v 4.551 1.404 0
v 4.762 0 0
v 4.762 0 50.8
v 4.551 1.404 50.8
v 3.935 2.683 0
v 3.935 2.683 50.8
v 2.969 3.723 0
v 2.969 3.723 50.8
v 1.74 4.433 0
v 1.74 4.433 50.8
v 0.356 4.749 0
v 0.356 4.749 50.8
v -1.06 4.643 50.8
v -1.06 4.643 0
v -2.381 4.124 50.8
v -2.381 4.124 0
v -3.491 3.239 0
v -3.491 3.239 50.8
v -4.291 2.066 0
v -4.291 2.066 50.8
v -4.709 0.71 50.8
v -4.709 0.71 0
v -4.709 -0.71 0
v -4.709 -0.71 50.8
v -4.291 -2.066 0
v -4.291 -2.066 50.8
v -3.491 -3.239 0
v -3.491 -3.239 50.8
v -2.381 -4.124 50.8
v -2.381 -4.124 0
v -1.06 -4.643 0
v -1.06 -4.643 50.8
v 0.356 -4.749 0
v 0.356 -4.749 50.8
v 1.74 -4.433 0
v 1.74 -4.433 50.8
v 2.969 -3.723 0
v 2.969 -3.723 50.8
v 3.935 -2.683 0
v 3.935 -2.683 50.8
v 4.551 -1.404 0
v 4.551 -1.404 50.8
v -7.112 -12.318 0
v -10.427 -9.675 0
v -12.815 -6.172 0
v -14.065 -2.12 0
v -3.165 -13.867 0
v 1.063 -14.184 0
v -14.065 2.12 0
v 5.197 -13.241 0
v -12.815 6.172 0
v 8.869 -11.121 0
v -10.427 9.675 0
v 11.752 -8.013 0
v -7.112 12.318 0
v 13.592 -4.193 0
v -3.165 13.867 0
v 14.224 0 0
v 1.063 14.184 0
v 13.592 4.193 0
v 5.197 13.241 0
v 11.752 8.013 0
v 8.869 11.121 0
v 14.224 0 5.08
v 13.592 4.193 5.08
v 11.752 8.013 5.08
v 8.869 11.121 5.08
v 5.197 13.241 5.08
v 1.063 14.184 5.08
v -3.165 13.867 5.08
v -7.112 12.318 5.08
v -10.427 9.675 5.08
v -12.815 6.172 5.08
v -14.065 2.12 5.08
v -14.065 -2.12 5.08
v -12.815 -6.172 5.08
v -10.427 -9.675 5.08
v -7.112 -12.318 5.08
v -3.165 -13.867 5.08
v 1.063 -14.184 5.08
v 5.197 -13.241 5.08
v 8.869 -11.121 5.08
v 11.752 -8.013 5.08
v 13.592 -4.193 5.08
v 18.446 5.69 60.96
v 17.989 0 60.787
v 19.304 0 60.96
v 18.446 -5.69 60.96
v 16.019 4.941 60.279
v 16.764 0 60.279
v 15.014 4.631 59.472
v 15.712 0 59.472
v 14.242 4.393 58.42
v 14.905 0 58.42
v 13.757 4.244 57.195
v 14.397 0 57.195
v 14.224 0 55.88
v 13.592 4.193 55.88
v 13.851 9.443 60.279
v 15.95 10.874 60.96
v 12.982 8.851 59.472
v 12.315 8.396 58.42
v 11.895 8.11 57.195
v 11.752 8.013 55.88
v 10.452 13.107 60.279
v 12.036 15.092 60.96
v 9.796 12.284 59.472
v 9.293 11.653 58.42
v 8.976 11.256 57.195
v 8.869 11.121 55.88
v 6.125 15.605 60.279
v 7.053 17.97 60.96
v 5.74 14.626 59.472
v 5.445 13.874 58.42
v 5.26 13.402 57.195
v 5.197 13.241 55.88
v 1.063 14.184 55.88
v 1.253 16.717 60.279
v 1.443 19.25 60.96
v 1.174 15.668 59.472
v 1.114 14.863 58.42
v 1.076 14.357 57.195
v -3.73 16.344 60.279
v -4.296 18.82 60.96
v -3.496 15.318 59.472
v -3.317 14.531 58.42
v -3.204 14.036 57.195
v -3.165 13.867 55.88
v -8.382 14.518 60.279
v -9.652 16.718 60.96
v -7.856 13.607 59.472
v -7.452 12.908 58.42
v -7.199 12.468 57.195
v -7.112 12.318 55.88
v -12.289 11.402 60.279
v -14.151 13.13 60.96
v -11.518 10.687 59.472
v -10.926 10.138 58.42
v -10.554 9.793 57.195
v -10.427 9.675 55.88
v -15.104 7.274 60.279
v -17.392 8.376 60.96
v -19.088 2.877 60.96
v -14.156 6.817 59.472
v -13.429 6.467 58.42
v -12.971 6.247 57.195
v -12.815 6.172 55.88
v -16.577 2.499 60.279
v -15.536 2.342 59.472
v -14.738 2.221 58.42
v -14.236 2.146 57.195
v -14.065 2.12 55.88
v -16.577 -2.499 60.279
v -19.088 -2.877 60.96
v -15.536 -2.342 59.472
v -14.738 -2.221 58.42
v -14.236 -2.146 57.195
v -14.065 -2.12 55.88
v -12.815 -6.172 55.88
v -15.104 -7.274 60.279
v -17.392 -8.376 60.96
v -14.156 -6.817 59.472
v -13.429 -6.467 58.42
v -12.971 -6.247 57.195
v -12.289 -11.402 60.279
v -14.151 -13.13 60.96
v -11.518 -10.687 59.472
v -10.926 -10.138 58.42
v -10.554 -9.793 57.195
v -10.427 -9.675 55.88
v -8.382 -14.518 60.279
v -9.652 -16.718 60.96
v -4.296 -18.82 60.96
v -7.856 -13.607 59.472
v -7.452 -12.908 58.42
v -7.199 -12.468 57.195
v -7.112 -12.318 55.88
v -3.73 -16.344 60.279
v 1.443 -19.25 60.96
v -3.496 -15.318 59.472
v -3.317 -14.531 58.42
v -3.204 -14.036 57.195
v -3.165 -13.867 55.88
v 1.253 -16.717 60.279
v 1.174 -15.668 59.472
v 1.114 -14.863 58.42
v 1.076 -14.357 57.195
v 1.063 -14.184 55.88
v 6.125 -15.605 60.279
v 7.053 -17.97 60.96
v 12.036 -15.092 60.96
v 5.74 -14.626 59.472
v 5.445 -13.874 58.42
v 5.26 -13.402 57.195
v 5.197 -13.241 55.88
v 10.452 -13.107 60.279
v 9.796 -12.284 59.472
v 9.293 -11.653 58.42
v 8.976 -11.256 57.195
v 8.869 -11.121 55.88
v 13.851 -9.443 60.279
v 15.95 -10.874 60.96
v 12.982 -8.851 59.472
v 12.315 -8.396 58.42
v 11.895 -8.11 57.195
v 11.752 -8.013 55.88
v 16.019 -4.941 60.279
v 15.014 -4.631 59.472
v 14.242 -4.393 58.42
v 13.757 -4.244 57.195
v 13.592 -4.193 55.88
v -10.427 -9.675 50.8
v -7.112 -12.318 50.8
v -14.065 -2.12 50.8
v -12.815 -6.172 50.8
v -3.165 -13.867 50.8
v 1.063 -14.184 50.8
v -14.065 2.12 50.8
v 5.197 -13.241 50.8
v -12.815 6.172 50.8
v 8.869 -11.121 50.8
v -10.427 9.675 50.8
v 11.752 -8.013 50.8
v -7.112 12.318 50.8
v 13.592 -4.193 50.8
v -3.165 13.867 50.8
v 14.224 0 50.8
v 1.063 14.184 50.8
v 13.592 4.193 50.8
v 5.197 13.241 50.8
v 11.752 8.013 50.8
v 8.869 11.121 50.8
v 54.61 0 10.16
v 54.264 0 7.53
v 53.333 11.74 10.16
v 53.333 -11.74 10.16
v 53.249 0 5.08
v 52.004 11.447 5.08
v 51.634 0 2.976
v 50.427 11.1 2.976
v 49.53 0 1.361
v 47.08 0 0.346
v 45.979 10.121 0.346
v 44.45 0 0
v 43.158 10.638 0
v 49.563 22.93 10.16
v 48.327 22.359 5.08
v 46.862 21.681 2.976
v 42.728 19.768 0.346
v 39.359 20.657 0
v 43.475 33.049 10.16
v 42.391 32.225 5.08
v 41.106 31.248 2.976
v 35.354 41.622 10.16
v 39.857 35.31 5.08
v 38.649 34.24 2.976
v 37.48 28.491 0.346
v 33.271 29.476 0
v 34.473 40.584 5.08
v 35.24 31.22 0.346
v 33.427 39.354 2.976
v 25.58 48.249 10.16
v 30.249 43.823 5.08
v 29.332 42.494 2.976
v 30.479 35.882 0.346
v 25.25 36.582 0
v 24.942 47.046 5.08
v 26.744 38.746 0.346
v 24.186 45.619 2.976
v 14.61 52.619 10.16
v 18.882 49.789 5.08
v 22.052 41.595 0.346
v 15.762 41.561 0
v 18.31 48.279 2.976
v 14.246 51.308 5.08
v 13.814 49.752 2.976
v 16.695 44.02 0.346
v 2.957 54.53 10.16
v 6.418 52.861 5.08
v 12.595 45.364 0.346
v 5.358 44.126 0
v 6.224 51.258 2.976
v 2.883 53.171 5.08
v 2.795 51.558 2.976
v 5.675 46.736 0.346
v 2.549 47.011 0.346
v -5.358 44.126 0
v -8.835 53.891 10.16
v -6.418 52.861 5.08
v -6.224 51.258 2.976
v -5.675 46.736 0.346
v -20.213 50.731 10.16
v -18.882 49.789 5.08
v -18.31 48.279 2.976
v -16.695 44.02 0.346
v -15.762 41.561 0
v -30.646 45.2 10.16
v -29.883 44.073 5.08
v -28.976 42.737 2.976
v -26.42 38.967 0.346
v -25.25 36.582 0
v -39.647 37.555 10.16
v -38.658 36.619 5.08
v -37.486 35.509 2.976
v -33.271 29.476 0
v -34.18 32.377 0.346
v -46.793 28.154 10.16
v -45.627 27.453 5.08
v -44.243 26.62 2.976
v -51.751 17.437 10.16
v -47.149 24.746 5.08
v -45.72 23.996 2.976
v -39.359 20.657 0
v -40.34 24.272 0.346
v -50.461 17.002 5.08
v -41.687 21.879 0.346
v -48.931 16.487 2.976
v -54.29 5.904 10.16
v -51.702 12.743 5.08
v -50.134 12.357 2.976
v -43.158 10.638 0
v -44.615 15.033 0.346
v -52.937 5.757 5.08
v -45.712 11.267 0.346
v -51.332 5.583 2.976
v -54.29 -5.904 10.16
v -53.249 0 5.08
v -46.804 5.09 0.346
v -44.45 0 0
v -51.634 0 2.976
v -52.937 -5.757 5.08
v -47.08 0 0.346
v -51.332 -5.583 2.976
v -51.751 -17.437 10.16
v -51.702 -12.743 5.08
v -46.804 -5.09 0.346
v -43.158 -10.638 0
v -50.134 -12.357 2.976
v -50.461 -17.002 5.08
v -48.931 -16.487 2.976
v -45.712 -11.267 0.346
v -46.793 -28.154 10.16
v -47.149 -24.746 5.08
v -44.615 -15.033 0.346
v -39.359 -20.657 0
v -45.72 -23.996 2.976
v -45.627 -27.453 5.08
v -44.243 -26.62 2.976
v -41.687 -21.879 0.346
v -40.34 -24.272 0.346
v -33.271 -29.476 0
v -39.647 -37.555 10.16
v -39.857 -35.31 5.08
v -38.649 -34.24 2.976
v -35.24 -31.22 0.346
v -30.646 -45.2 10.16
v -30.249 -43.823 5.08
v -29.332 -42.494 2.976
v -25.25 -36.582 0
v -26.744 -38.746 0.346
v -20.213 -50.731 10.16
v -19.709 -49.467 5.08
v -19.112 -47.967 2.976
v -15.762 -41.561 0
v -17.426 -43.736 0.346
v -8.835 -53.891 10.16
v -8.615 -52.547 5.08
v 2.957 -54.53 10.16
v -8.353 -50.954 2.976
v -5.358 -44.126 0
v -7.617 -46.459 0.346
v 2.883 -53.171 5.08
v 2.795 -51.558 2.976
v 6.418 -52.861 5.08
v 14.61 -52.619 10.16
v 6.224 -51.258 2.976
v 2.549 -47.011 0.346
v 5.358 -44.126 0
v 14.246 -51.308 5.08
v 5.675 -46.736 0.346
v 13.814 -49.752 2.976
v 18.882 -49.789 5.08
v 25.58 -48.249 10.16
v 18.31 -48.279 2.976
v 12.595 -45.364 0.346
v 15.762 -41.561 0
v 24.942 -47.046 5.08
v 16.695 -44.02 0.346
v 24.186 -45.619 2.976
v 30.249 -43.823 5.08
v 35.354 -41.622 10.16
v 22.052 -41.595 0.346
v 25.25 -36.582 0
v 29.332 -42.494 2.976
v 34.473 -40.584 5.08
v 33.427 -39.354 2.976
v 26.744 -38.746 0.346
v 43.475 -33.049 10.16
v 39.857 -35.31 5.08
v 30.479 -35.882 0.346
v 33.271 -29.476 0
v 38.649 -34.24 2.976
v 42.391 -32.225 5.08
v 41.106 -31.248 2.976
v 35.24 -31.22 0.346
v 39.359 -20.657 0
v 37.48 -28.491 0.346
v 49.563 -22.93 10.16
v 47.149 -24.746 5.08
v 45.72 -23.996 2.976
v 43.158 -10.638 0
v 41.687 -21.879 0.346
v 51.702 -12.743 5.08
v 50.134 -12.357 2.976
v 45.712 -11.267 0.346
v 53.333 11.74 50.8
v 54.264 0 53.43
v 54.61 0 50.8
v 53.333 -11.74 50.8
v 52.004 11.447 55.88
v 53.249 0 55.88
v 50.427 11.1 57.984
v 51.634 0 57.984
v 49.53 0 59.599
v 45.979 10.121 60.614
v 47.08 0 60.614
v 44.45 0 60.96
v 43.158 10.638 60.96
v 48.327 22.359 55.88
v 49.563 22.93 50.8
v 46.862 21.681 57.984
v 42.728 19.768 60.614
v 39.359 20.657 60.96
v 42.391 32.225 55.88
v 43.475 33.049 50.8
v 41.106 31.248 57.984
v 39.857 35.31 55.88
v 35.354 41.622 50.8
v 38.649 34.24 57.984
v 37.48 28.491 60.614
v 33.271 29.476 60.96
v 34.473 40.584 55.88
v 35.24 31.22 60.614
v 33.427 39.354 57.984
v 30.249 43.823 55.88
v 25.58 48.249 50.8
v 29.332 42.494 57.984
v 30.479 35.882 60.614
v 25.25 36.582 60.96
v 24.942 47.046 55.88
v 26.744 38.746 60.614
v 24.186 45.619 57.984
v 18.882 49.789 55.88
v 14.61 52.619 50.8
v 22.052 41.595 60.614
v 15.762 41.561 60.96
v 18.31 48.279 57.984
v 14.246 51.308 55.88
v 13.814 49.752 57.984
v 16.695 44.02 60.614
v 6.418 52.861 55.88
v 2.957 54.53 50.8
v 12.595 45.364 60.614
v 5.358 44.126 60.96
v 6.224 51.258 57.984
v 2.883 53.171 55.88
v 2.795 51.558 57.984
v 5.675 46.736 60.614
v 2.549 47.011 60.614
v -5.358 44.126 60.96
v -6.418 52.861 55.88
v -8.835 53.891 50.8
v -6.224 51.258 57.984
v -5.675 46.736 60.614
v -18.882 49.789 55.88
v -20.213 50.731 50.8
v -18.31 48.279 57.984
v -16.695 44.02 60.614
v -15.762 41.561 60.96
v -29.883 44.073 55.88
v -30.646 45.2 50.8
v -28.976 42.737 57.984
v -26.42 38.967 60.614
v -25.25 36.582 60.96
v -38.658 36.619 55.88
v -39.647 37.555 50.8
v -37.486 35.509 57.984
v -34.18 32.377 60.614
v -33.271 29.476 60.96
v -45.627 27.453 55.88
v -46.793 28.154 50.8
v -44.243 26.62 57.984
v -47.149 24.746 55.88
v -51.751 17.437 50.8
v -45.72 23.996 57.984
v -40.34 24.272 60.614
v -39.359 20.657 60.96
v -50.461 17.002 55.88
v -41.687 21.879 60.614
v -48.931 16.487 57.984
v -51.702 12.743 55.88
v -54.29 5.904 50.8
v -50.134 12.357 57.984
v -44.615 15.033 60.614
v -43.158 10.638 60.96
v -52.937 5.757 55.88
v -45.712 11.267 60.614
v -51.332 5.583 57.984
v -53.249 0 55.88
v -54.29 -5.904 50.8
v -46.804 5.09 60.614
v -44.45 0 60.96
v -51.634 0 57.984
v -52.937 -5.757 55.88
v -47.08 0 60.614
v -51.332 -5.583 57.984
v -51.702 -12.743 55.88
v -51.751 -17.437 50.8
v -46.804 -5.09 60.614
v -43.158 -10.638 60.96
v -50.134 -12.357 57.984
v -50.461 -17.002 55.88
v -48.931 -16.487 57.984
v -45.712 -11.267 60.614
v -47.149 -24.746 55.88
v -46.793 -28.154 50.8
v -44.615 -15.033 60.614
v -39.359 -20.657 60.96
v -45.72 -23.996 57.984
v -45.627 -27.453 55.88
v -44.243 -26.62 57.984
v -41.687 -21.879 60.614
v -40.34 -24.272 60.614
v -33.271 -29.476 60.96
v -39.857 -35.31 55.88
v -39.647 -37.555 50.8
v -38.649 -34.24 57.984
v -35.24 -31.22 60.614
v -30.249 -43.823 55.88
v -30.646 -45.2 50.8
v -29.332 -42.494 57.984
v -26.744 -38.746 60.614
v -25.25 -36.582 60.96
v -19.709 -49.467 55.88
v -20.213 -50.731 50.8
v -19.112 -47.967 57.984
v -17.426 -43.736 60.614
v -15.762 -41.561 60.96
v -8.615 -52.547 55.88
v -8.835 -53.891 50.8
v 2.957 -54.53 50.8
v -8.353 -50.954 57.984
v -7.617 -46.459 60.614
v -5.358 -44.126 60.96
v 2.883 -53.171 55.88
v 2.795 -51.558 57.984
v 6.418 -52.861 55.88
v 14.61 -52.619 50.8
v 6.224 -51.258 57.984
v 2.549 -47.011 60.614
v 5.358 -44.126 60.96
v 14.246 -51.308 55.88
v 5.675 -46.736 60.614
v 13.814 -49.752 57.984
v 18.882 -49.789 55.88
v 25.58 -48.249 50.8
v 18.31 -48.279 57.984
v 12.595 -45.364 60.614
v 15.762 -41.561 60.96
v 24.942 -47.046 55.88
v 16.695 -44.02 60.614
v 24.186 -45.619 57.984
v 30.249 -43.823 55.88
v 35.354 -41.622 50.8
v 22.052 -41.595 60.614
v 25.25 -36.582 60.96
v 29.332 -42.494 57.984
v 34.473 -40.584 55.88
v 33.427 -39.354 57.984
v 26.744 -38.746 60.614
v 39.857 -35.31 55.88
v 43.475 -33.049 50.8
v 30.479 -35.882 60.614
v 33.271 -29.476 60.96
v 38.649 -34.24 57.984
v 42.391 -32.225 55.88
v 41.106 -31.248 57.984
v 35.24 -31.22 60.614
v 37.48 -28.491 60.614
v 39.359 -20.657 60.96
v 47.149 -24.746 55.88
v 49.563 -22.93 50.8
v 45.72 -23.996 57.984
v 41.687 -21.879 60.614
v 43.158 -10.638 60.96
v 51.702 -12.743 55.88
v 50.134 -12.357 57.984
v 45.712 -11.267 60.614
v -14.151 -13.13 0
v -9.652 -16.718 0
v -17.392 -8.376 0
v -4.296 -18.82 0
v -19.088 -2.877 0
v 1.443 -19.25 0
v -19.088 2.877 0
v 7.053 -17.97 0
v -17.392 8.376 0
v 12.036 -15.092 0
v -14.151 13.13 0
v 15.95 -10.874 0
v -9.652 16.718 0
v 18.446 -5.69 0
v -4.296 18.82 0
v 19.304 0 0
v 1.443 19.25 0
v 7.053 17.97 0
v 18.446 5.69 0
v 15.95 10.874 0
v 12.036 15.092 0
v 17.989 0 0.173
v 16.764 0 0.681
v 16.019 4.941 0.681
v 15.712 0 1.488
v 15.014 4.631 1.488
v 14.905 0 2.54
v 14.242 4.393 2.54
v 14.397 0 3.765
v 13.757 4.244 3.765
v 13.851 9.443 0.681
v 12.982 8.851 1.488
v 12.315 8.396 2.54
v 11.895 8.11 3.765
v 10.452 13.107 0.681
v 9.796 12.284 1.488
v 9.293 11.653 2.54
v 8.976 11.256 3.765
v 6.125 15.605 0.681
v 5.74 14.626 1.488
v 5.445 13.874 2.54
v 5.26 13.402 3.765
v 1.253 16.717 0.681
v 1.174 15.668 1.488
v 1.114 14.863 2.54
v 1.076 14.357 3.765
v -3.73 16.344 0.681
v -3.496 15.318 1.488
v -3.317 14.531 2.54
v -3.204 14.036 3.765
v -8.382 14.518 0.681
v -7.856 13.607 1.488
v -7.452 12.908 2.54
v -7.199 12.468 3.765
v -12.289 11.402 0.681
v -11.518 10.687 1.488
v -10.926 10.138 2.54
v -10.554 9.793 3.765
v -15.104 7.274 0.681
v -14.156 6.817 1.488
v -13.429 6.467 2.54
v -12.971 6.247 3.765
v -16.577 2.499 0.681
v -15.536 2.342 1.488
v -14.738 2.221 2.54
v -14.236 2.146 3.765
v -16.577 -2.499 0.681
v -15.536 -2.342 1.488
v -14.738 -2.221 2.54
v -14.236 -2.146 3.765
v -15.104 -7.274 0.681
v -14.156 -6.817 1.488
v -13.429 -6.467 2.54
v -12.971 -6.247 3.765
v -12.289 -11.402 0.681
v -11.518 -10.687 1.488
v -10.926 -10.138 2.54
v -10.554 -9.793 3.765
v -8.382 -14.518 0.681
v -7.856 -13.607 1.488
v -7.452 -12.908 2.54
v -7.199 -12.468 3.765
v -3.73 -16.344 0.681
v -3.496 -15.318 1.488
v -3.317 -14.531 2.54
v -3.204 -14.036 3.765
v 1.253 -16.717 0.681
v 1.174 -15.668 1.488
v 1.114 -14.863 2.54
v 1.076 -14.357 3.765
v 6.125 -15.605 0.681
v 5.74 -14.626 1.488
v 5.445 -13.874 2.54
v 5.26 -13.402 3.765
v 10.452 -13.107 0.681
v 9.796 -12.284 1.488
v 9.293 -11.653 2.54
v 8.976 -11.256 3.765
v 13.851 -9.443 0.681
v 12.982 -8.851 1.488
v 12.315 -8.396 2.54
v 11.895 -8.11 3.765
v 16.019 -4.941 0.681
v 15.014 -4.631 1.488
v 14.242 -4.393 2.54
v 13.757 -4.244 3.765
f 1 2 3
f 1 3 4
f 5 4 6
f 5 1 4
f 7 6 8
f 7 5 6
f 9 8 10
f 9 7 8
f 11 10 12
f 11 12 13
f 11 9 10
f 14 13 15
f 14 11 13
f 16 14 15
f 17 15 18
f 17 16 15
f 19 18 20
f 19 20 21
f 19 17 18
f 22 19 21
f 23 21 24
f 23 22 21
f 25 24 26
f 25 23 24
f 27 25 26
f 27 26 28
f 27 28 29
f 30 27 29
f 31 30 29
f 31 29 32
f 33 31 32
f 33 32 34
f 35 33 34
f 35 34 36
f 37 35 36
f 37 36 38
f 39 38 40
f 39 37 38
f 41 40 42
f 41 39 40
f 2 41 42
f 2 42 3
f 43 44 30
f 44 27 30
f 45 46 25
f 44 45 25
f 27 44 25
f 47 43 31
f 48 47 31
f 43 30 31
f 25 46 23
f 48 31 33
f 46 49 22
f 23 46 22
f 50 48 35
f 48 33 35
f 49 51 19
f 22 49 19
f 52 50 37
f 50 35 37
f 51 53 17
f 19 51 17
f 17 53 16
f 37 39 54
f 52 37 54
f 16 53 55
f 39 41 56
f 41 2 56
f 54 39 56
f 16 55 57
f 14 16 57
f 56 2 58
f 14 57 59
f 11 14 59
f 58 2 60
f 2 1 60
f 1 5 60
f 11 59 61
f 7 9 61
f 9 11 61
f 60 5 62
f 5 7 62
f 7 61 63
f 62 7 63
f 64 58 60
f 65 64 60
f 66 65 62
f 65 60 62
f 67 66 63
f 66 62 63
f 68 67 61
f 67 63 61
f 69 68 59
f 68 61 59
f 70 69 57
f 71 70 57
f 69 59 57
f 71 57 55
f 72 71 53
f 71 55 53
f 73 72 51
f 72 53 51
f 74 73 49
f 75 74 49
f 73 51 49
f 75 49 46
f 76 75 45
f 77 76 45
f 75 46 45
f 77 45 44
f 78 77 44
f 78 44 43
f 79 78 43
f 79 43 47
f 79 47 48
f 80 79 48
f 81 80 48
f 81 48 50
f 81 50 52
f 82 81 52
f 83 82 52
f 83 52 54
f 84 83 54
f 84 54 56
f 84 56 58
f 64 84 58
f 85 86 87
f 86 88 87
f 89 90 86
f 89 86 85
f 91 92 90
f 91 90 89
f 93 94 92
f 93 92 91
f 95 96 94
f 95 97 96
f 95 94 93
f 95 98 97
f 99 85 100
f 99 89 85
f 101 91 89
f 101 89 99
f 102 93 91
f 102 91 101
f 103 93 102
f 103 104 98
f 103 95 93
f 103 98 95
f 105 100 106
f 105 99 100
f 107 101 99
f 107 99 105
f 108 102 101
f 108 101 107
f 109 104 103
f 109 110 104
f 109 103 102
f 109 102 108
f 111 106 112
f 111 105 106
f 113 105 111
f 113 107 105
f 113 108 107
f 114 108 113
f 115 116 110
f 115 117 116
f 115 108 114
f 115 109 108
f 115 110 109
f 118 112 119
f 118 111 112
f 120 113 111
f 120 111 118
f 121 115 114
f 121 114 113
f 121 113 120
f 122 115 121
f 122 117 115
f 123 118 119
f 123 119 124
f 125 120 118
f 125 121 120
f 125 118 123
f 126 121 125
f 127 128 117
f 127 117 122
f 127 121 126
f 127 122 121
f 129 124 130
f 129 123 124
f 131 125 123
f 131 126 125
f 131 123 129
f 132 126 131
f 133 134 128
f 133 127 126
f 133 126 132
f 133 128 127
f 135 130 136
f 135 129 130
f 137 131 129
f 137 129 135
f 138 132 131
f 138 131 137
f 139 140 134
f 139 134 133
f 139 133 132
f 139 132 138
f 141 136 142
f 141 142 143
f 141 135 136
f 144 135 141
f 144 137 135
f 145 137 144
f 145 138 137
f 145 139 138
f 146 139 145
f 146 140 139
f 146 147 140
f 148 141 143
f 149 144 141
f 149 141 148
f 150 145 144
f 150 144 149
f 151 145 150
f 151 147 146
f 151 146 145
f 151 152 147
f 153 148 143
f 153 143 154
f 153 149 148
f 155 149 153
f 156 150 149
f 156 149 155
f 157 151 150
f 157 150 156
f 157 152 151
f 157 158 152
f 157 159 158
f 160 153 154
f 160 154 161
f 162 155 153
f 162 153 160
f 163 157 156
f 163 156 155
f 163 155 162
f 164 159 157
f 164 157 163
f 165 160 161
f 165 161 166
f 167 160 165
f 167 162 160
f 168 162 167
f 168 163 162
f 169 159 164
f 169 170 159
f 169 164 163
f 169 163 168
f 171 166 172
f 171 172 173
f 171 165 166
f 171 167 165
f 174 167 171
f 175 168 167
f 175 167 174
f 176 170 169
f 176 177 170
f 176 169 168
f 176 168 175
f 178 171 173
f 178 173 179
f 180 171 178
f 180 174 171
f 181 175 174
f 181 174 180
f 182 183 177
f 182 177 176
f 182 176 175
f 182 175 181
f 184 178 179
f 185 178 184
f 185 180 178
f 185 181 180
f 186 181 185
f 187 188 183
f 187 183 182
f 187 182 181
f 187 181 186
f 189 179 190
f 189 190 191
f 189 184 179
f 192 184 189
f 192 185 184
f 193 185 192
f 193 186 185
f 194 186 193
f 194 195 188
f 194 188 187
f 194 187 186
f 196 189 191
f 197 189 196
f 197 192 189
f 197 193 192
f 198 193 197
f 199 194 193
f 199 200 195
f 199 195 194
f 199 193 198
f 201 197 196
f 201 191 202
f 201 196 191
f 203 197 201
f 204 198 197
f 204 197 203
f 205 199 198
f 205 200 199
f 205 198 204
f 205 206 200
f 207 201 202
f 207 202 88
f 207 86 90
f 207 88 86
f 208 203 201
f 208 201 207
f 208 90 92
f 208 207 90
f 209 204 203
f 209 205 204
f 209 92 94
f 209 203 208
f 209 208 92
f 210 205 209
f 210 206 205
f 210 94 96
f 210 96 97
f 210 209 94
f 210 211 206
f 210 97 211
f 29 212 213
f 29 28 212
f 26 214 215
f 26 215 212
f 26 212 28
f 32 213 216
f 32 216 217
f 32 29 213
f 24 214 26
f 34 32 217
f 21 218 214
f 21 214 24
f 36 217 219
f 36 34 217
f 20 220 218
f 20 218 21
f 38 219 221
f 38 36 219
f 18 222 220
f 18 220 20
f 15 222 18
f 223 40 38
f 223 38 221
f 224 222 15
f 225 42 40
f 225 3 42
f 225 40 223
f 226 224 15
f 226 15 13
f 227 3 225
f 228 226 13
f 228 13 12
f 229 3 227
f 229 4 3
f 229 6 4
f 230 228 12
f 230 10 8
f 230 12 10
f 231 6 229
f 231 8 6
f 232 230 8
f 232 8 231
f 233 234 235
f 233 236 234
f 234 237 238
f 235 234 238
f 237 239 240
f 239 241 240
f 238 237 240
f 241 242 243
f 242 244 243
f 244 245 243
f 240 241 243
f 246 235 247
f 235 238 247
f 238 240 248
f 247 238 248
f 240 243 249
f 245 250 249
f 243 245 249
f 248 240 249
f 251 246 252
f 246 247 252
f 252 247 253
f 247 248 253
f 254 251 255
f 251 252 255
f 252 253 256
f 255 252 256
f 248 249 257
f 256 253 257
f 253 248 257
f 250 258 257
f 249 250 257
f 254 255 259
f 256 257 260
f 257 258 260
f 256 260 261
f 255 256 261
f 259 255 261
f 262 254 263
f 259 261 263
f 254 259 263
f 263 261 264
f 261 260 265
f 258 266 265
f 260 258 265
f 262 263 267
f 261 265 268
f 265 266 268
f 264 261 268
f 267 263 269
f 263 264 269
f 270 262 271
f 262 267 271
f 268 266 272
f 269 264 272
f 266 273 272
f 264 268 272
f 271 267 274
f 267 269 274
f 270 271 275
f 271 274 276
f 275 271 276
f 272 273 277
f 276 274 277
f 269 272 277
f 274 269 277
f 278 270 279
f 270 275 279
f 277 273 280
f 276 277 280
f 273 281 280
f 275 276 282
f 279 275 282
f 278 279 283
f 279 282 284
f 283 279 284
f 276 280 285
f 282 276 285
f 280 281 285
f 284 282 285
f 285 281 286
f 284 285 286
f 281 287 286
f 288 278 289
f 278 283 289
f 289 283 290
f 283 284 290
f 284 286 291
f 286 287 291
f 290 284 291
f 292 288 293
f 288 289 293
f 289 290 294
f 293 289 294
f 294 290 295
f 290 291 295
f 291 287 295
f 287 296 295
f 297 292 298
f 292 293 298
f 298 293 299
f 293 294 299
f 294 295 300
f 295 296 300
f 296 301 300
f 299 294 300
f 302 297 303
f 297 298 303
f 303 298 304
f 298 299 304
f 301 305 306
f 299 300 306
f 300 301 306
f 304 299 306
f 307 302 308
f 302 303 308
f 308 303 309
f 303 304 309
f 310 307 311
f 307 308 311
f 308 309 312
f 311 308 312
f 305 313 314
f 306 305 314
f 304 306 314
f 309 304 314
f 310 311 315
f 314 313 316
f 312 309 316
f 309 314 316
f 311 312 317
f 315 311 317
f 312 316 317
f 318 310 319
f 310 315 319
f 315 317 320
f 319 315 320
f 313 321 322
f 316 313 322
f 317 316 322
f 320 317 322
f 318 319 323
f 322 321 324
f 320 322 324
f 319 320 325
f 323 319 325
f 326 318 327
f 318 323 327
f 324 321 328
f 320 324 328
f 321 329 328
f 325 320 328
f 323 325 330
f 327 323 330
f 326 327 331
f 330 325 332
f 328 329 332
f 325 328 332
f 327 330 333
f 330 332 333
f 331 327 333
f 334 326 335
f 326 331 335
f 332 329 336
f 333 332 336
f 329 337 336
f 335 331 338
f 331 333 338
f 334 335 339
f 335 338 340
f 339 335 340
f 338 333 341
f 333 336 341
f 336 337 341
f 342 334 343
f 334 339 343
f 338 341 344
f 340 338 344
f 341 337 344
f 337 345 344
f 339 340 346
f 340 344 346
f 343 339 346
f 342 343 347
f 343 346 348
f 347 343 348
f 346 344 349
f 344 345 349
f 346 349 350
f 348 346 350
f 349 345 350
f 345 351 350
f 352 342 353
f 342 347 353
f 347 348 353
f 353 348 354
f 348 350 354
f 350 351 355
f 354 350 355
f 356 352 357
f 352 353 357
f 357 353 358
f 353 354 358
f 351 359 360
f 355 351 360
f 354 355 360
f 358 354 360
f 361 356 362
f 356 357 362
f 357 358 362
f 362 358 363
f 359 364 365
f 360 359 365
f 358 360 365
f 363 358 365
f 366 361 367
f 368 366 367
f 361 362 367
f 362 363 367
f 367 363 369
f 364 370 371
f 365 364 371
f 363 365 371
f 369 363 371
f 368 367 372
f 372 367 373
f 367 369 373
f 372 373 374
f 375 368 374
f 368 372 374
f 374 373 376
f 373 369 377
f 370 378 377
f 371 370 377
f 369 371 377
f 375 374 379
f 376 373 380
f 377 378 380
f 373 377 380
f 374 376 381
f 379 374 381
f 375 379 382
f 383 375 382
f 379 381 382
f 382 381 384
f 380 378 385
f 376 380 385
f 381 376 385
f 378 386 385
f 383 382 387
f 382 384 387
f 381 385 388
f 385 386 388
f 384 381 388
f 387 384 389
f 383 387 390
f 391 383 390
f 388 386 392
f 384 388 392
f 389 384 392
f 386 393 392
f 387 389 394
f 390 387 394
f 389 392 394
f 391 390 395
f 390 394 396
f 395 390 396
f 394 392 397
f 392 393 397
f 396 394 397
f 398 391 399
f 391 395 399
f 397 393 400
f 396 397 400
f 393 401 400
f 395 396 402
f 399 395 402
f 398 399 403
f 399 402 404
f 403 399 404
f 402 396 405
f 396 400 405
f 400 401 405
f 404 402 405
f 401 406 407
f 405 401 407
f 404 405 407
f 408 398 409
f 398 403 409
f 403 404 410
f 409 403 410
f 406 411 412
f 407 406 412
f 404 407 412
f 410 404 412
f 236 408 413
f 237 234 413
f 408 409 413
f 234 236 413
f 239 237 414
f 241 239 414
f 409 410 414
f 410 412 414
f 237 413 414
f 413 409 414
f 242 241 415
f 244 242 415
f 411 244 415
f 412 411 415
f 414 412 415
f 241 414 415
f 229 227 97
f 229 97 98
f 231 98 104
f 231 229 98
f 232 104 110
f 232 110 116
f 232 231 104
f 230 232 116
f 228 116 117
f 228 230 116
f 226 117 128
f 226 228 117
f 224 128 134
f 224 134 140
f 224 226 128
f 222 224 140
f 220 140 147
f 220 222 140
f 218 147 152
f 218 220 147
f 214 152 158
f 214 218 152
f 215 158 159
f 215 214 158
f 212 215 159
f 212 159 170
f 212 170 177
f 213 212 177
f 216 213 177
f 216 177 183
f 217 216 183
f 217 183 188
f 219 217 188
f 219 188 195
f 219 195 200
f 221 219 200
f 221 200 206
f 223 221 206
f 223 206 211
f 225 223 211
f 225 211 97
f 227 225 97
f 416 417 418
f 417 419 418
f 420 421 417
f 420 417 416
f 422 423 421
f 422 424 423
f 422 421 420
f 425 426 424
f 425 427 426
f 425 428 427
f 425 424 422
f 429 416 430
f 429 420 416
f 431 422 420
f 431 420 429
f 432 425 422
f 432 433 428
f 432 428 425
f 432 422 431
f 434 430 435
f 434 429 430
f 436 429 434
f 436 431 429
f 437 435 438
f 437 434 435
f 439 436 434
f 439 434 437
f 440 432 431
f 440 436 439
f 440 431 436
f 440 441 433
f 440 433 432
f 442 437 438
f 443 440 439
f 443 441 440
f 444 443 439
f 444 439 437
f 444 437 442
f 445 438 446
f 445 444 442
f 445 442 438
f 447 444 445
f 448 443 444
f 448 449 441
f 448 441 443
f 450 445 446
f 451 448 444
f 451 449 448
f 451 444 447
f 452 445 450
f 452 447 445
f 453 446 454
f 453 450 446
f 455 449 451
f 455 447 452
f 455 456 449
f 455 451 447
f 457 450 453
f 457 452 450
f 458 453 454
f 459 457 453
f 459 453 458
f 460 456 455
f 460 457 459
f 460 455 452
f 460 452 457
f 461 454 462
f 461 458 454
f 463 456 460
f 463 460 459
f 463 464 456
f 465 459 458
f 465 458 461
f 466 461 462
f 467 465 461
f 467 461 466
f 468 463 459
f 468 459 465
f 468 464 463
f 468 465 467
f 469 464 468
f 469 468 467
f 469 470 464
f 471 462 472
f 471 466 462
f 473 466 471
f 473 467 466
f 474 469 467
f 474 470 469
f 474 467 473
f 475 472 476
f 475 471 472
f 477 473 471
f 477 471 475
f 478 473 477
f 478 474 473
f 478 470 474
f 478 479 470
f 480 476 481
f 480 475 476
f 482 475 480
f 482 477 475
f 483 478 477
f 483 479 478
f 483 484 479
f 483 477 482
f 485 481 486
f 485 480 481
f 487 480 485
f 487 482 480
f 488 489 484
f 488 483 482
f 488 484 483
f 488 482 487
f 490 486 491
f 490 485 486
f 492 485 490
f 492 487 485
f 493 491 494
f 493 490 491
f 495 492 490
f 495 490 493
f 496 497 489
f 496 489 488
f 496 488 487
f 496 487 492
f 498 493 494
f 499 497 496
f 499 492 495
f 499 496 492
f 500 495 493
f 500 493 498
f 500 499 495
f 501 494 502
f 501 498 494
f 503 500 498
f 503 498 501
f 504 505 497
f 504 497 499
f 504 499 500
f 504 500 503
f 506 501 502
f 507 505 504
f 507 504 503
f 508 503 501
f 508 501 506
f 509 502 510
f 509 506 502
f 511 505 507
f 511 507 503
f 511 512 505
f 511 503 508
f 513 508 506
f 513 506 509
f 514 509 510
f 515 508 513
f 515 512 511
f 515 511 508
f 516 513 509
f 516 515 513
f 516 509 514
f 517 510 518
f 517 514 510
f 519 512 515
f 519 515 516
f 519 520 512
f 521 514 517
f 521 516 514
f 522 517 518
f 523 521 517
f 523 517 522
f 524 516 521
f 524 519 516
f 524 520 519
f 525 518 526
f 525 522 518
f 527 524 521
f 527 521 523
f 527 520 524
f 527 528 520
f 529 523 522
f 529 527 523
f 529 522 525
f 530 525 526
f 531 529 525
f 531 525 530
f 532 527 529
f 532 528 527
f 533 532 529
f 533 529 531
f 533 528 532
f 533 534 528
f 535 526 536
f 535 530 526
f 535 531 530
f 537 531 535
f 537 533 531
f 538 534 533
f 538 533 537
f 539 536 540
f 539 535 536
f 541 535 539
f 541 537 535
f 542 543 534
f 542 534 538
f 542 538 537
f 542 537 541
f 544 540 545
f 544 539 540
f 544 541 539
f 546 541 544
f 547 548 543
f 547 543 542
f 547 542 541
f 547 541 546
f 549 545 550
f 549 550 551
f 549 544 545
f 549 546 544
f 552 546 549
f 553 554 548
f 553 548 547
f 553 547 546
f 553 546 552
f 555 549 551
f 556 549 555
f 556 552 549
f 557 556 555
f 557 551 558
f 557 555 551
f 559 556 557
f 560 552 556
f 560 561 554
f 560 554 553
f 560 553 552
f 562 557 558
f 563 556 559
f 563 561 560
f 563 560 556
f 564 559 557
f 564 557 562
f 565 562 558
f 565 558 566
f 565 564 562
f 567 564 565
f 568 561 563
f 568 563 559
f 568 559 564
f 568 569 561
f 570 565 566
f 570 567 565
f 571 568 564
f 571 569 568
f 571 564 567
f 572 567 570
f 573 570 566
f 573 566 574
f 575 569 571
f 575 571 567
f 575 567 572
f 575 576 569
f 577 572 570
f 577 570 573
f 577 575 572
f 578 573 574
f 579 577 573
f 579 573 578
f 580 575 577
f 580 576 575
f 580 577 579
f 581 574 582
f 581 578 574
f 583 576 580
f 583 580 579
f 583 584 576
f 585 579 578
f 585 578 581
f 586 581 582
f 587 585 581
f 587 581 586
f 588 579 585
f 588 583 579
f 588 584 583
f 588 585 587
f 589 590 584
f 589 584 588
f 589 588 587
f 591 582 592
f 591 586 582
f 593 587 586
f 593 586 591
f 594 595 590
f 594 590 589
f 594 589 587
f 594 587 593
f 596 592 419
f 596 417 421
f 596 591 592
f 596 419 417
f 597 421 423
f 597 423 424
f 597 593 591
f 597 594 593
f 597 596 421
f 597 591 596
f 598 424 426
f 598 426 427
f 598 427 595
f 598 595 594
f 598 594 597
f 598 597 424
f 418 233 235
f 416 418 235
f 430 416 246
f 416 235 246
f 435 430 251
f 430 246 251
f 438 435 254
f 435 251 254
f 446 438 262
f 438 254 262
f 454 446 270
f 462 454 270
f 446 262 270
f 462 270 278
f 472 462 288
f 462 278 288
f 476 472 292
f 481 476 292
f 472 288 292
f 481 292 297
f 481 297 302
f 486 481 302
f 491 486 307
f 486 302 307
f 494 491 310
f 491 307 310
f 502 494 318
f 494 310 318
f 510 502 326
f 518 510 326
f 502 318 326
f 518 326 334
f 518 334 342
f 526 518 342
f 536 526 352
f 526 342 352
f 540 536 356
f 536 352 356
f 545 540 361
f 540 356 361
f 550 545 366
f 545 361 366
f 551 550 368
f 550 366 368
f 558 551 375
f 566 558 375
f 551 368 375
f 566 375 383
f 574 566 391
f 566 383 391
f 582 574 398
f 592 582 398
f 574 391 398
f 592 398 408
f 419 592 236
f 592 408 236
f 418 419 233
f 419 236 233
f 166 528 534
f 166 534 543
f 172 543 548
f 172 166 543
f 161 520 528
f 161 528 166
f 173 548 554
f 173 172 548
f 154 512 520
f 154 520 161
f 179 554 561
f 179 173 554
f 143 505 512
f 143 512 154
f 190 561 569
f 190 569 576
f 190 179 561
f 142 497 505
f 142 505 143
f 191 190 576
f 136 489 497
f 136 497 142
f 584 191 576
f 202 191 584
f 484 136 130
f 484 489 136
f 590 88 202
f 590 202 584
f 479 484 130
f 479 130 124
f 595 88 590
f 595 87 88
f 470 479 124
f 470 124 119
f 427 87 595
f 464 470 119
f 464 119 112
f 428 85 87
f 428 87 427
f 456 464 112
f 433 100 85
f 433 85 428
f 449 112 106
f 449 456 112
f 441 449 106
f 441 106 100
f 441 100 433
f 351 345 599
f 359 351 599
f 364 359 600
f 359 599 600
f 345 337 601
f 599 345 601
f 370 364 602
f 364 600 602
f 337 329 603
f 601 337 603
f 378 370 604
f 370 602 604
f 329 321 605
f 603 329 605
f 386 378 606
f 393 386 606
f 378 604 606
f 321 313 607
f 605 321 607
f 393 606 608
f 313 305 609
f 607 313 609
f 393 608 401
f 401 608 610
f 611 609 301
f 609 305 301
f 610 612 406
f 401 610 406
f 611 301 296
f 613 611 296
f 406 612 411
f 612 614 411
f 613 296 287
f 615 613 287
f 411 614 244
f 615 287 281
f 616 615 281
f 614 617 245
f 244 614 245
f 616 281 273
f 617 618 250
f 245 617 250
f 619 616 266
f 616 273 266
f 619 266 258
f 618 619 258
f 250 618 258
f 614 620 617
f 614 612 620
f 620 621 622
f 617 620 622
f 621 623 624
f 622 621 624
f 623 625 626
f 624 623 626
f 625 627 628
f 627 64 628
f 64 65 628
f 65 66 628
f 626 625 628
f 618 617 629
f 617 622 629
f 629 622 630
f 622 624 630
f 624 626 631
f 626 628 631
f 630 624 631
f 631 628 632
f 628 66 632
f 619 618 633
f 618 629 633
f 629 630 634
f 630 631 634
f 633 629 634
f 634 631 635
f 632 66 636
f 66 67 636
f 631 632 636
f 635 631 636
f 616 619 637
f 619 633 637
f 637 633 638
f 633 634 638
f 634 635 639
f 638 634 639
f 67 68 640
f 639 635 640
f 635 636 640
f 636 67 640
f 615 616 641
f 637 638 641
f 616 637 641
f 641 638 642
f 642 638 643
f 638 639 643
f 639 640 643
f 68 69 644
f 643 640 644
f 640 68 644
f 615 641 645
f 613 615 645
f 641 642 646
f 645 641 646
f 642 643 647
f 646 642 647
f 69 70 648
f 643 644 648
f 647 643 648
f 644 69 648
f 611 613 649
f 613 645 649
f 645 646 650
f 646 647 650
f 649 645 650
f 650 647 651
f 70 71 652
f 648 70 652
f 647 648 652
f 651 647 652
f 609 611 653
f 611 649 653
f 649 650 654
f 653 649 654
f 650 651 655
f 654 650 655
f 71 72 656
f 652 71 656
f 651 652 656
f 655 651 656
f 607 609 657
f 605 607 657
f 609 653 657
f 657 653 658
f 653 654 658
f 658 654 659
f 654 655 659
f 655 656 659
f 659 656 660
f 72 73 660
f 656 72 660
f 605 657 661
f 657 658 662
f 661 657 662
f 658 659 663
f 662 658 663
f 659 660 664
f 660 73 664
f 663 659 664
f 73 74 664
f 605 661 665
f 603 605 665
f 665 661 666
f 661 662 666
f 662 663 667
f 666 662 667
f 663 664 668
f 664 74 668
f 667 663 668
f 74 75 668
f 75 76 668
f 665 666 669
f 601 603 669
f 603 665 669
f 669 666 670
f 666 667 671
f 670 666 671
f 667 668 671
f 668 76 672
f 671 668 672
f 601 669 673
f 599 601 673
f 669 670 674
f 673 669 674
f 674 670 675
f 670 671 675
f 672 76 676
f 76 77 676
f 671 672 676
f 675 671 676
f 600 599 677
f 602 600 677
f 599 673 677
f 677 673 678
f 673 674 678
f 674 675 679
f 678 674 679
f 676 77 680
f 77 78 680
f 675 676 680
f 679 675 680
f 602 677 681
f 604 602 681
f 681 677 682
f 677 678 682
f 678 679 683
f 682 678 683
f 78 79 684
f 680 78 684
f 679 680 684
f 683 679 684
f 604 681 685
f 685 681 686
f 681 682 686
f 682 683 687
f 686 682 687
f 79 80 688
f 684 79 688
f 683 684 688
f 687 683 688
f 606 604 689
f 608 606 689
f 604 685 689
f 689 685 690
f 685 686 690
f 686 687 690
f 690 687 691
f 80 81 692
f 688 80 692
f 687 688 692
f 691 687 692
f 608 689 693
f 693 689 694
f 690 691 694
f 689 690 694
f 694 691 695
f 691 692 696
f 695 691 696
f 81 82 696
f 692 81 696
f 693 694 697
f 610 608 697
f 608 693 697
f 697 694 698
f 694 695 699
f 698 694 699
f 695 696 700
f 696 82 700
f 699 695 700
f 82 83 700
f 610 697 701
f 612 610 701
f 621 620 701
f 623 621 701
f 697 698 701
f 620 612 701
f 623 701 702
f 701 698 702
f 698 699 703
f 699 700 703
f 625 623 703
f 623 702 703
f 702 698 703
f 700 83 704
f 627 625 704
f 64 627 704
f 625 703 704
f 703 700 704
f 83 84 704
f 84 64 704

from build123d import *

# Parameters (mm, degrees)
F0_R     = 54.61
F0_R_2   = 14.224
F1_DEPTH = 60.96
F2_R     = 10.16
F3_R     = 5.08
F0_R_3   = 4.7625
F4_DEPTH = 50.8


with BuildPart() as f1:
    # F0 (on Top) → F1 (new body)
    with BuildSketch(Plane.XY):
        Circle(F0_R)
        Circle(F0_R_2, mode=Mode.SUBTRACT)
    extrude(amount=F1_DEPTH)

    # F2
    f2_edges = [f1.edges().sort_by_distance(p)[0] for p in [
        (-54.61, 0, 0),
        (-54.61, 0, 60.96),
    ]]
    fillet(f2_edges, radius=F2_R)

    # F3
    f3_edges = [f1.edges().sort_by_distance(p)[0] for p in [
        (-14.224, 0, 60.96),
        (-14.224, 0, 0),
    ]]
    fillet(f3_edges, radius=F3_R)

    # F0 (on Top) → F4 (join)
    with BuildSketch(Plane.XY):
        Circle(F0_R_2)
        Circle(F0_R_3, mode=Mode.SUBTRACT)
    extrude(amount=F4_DEPTH)


solid = f1.part
